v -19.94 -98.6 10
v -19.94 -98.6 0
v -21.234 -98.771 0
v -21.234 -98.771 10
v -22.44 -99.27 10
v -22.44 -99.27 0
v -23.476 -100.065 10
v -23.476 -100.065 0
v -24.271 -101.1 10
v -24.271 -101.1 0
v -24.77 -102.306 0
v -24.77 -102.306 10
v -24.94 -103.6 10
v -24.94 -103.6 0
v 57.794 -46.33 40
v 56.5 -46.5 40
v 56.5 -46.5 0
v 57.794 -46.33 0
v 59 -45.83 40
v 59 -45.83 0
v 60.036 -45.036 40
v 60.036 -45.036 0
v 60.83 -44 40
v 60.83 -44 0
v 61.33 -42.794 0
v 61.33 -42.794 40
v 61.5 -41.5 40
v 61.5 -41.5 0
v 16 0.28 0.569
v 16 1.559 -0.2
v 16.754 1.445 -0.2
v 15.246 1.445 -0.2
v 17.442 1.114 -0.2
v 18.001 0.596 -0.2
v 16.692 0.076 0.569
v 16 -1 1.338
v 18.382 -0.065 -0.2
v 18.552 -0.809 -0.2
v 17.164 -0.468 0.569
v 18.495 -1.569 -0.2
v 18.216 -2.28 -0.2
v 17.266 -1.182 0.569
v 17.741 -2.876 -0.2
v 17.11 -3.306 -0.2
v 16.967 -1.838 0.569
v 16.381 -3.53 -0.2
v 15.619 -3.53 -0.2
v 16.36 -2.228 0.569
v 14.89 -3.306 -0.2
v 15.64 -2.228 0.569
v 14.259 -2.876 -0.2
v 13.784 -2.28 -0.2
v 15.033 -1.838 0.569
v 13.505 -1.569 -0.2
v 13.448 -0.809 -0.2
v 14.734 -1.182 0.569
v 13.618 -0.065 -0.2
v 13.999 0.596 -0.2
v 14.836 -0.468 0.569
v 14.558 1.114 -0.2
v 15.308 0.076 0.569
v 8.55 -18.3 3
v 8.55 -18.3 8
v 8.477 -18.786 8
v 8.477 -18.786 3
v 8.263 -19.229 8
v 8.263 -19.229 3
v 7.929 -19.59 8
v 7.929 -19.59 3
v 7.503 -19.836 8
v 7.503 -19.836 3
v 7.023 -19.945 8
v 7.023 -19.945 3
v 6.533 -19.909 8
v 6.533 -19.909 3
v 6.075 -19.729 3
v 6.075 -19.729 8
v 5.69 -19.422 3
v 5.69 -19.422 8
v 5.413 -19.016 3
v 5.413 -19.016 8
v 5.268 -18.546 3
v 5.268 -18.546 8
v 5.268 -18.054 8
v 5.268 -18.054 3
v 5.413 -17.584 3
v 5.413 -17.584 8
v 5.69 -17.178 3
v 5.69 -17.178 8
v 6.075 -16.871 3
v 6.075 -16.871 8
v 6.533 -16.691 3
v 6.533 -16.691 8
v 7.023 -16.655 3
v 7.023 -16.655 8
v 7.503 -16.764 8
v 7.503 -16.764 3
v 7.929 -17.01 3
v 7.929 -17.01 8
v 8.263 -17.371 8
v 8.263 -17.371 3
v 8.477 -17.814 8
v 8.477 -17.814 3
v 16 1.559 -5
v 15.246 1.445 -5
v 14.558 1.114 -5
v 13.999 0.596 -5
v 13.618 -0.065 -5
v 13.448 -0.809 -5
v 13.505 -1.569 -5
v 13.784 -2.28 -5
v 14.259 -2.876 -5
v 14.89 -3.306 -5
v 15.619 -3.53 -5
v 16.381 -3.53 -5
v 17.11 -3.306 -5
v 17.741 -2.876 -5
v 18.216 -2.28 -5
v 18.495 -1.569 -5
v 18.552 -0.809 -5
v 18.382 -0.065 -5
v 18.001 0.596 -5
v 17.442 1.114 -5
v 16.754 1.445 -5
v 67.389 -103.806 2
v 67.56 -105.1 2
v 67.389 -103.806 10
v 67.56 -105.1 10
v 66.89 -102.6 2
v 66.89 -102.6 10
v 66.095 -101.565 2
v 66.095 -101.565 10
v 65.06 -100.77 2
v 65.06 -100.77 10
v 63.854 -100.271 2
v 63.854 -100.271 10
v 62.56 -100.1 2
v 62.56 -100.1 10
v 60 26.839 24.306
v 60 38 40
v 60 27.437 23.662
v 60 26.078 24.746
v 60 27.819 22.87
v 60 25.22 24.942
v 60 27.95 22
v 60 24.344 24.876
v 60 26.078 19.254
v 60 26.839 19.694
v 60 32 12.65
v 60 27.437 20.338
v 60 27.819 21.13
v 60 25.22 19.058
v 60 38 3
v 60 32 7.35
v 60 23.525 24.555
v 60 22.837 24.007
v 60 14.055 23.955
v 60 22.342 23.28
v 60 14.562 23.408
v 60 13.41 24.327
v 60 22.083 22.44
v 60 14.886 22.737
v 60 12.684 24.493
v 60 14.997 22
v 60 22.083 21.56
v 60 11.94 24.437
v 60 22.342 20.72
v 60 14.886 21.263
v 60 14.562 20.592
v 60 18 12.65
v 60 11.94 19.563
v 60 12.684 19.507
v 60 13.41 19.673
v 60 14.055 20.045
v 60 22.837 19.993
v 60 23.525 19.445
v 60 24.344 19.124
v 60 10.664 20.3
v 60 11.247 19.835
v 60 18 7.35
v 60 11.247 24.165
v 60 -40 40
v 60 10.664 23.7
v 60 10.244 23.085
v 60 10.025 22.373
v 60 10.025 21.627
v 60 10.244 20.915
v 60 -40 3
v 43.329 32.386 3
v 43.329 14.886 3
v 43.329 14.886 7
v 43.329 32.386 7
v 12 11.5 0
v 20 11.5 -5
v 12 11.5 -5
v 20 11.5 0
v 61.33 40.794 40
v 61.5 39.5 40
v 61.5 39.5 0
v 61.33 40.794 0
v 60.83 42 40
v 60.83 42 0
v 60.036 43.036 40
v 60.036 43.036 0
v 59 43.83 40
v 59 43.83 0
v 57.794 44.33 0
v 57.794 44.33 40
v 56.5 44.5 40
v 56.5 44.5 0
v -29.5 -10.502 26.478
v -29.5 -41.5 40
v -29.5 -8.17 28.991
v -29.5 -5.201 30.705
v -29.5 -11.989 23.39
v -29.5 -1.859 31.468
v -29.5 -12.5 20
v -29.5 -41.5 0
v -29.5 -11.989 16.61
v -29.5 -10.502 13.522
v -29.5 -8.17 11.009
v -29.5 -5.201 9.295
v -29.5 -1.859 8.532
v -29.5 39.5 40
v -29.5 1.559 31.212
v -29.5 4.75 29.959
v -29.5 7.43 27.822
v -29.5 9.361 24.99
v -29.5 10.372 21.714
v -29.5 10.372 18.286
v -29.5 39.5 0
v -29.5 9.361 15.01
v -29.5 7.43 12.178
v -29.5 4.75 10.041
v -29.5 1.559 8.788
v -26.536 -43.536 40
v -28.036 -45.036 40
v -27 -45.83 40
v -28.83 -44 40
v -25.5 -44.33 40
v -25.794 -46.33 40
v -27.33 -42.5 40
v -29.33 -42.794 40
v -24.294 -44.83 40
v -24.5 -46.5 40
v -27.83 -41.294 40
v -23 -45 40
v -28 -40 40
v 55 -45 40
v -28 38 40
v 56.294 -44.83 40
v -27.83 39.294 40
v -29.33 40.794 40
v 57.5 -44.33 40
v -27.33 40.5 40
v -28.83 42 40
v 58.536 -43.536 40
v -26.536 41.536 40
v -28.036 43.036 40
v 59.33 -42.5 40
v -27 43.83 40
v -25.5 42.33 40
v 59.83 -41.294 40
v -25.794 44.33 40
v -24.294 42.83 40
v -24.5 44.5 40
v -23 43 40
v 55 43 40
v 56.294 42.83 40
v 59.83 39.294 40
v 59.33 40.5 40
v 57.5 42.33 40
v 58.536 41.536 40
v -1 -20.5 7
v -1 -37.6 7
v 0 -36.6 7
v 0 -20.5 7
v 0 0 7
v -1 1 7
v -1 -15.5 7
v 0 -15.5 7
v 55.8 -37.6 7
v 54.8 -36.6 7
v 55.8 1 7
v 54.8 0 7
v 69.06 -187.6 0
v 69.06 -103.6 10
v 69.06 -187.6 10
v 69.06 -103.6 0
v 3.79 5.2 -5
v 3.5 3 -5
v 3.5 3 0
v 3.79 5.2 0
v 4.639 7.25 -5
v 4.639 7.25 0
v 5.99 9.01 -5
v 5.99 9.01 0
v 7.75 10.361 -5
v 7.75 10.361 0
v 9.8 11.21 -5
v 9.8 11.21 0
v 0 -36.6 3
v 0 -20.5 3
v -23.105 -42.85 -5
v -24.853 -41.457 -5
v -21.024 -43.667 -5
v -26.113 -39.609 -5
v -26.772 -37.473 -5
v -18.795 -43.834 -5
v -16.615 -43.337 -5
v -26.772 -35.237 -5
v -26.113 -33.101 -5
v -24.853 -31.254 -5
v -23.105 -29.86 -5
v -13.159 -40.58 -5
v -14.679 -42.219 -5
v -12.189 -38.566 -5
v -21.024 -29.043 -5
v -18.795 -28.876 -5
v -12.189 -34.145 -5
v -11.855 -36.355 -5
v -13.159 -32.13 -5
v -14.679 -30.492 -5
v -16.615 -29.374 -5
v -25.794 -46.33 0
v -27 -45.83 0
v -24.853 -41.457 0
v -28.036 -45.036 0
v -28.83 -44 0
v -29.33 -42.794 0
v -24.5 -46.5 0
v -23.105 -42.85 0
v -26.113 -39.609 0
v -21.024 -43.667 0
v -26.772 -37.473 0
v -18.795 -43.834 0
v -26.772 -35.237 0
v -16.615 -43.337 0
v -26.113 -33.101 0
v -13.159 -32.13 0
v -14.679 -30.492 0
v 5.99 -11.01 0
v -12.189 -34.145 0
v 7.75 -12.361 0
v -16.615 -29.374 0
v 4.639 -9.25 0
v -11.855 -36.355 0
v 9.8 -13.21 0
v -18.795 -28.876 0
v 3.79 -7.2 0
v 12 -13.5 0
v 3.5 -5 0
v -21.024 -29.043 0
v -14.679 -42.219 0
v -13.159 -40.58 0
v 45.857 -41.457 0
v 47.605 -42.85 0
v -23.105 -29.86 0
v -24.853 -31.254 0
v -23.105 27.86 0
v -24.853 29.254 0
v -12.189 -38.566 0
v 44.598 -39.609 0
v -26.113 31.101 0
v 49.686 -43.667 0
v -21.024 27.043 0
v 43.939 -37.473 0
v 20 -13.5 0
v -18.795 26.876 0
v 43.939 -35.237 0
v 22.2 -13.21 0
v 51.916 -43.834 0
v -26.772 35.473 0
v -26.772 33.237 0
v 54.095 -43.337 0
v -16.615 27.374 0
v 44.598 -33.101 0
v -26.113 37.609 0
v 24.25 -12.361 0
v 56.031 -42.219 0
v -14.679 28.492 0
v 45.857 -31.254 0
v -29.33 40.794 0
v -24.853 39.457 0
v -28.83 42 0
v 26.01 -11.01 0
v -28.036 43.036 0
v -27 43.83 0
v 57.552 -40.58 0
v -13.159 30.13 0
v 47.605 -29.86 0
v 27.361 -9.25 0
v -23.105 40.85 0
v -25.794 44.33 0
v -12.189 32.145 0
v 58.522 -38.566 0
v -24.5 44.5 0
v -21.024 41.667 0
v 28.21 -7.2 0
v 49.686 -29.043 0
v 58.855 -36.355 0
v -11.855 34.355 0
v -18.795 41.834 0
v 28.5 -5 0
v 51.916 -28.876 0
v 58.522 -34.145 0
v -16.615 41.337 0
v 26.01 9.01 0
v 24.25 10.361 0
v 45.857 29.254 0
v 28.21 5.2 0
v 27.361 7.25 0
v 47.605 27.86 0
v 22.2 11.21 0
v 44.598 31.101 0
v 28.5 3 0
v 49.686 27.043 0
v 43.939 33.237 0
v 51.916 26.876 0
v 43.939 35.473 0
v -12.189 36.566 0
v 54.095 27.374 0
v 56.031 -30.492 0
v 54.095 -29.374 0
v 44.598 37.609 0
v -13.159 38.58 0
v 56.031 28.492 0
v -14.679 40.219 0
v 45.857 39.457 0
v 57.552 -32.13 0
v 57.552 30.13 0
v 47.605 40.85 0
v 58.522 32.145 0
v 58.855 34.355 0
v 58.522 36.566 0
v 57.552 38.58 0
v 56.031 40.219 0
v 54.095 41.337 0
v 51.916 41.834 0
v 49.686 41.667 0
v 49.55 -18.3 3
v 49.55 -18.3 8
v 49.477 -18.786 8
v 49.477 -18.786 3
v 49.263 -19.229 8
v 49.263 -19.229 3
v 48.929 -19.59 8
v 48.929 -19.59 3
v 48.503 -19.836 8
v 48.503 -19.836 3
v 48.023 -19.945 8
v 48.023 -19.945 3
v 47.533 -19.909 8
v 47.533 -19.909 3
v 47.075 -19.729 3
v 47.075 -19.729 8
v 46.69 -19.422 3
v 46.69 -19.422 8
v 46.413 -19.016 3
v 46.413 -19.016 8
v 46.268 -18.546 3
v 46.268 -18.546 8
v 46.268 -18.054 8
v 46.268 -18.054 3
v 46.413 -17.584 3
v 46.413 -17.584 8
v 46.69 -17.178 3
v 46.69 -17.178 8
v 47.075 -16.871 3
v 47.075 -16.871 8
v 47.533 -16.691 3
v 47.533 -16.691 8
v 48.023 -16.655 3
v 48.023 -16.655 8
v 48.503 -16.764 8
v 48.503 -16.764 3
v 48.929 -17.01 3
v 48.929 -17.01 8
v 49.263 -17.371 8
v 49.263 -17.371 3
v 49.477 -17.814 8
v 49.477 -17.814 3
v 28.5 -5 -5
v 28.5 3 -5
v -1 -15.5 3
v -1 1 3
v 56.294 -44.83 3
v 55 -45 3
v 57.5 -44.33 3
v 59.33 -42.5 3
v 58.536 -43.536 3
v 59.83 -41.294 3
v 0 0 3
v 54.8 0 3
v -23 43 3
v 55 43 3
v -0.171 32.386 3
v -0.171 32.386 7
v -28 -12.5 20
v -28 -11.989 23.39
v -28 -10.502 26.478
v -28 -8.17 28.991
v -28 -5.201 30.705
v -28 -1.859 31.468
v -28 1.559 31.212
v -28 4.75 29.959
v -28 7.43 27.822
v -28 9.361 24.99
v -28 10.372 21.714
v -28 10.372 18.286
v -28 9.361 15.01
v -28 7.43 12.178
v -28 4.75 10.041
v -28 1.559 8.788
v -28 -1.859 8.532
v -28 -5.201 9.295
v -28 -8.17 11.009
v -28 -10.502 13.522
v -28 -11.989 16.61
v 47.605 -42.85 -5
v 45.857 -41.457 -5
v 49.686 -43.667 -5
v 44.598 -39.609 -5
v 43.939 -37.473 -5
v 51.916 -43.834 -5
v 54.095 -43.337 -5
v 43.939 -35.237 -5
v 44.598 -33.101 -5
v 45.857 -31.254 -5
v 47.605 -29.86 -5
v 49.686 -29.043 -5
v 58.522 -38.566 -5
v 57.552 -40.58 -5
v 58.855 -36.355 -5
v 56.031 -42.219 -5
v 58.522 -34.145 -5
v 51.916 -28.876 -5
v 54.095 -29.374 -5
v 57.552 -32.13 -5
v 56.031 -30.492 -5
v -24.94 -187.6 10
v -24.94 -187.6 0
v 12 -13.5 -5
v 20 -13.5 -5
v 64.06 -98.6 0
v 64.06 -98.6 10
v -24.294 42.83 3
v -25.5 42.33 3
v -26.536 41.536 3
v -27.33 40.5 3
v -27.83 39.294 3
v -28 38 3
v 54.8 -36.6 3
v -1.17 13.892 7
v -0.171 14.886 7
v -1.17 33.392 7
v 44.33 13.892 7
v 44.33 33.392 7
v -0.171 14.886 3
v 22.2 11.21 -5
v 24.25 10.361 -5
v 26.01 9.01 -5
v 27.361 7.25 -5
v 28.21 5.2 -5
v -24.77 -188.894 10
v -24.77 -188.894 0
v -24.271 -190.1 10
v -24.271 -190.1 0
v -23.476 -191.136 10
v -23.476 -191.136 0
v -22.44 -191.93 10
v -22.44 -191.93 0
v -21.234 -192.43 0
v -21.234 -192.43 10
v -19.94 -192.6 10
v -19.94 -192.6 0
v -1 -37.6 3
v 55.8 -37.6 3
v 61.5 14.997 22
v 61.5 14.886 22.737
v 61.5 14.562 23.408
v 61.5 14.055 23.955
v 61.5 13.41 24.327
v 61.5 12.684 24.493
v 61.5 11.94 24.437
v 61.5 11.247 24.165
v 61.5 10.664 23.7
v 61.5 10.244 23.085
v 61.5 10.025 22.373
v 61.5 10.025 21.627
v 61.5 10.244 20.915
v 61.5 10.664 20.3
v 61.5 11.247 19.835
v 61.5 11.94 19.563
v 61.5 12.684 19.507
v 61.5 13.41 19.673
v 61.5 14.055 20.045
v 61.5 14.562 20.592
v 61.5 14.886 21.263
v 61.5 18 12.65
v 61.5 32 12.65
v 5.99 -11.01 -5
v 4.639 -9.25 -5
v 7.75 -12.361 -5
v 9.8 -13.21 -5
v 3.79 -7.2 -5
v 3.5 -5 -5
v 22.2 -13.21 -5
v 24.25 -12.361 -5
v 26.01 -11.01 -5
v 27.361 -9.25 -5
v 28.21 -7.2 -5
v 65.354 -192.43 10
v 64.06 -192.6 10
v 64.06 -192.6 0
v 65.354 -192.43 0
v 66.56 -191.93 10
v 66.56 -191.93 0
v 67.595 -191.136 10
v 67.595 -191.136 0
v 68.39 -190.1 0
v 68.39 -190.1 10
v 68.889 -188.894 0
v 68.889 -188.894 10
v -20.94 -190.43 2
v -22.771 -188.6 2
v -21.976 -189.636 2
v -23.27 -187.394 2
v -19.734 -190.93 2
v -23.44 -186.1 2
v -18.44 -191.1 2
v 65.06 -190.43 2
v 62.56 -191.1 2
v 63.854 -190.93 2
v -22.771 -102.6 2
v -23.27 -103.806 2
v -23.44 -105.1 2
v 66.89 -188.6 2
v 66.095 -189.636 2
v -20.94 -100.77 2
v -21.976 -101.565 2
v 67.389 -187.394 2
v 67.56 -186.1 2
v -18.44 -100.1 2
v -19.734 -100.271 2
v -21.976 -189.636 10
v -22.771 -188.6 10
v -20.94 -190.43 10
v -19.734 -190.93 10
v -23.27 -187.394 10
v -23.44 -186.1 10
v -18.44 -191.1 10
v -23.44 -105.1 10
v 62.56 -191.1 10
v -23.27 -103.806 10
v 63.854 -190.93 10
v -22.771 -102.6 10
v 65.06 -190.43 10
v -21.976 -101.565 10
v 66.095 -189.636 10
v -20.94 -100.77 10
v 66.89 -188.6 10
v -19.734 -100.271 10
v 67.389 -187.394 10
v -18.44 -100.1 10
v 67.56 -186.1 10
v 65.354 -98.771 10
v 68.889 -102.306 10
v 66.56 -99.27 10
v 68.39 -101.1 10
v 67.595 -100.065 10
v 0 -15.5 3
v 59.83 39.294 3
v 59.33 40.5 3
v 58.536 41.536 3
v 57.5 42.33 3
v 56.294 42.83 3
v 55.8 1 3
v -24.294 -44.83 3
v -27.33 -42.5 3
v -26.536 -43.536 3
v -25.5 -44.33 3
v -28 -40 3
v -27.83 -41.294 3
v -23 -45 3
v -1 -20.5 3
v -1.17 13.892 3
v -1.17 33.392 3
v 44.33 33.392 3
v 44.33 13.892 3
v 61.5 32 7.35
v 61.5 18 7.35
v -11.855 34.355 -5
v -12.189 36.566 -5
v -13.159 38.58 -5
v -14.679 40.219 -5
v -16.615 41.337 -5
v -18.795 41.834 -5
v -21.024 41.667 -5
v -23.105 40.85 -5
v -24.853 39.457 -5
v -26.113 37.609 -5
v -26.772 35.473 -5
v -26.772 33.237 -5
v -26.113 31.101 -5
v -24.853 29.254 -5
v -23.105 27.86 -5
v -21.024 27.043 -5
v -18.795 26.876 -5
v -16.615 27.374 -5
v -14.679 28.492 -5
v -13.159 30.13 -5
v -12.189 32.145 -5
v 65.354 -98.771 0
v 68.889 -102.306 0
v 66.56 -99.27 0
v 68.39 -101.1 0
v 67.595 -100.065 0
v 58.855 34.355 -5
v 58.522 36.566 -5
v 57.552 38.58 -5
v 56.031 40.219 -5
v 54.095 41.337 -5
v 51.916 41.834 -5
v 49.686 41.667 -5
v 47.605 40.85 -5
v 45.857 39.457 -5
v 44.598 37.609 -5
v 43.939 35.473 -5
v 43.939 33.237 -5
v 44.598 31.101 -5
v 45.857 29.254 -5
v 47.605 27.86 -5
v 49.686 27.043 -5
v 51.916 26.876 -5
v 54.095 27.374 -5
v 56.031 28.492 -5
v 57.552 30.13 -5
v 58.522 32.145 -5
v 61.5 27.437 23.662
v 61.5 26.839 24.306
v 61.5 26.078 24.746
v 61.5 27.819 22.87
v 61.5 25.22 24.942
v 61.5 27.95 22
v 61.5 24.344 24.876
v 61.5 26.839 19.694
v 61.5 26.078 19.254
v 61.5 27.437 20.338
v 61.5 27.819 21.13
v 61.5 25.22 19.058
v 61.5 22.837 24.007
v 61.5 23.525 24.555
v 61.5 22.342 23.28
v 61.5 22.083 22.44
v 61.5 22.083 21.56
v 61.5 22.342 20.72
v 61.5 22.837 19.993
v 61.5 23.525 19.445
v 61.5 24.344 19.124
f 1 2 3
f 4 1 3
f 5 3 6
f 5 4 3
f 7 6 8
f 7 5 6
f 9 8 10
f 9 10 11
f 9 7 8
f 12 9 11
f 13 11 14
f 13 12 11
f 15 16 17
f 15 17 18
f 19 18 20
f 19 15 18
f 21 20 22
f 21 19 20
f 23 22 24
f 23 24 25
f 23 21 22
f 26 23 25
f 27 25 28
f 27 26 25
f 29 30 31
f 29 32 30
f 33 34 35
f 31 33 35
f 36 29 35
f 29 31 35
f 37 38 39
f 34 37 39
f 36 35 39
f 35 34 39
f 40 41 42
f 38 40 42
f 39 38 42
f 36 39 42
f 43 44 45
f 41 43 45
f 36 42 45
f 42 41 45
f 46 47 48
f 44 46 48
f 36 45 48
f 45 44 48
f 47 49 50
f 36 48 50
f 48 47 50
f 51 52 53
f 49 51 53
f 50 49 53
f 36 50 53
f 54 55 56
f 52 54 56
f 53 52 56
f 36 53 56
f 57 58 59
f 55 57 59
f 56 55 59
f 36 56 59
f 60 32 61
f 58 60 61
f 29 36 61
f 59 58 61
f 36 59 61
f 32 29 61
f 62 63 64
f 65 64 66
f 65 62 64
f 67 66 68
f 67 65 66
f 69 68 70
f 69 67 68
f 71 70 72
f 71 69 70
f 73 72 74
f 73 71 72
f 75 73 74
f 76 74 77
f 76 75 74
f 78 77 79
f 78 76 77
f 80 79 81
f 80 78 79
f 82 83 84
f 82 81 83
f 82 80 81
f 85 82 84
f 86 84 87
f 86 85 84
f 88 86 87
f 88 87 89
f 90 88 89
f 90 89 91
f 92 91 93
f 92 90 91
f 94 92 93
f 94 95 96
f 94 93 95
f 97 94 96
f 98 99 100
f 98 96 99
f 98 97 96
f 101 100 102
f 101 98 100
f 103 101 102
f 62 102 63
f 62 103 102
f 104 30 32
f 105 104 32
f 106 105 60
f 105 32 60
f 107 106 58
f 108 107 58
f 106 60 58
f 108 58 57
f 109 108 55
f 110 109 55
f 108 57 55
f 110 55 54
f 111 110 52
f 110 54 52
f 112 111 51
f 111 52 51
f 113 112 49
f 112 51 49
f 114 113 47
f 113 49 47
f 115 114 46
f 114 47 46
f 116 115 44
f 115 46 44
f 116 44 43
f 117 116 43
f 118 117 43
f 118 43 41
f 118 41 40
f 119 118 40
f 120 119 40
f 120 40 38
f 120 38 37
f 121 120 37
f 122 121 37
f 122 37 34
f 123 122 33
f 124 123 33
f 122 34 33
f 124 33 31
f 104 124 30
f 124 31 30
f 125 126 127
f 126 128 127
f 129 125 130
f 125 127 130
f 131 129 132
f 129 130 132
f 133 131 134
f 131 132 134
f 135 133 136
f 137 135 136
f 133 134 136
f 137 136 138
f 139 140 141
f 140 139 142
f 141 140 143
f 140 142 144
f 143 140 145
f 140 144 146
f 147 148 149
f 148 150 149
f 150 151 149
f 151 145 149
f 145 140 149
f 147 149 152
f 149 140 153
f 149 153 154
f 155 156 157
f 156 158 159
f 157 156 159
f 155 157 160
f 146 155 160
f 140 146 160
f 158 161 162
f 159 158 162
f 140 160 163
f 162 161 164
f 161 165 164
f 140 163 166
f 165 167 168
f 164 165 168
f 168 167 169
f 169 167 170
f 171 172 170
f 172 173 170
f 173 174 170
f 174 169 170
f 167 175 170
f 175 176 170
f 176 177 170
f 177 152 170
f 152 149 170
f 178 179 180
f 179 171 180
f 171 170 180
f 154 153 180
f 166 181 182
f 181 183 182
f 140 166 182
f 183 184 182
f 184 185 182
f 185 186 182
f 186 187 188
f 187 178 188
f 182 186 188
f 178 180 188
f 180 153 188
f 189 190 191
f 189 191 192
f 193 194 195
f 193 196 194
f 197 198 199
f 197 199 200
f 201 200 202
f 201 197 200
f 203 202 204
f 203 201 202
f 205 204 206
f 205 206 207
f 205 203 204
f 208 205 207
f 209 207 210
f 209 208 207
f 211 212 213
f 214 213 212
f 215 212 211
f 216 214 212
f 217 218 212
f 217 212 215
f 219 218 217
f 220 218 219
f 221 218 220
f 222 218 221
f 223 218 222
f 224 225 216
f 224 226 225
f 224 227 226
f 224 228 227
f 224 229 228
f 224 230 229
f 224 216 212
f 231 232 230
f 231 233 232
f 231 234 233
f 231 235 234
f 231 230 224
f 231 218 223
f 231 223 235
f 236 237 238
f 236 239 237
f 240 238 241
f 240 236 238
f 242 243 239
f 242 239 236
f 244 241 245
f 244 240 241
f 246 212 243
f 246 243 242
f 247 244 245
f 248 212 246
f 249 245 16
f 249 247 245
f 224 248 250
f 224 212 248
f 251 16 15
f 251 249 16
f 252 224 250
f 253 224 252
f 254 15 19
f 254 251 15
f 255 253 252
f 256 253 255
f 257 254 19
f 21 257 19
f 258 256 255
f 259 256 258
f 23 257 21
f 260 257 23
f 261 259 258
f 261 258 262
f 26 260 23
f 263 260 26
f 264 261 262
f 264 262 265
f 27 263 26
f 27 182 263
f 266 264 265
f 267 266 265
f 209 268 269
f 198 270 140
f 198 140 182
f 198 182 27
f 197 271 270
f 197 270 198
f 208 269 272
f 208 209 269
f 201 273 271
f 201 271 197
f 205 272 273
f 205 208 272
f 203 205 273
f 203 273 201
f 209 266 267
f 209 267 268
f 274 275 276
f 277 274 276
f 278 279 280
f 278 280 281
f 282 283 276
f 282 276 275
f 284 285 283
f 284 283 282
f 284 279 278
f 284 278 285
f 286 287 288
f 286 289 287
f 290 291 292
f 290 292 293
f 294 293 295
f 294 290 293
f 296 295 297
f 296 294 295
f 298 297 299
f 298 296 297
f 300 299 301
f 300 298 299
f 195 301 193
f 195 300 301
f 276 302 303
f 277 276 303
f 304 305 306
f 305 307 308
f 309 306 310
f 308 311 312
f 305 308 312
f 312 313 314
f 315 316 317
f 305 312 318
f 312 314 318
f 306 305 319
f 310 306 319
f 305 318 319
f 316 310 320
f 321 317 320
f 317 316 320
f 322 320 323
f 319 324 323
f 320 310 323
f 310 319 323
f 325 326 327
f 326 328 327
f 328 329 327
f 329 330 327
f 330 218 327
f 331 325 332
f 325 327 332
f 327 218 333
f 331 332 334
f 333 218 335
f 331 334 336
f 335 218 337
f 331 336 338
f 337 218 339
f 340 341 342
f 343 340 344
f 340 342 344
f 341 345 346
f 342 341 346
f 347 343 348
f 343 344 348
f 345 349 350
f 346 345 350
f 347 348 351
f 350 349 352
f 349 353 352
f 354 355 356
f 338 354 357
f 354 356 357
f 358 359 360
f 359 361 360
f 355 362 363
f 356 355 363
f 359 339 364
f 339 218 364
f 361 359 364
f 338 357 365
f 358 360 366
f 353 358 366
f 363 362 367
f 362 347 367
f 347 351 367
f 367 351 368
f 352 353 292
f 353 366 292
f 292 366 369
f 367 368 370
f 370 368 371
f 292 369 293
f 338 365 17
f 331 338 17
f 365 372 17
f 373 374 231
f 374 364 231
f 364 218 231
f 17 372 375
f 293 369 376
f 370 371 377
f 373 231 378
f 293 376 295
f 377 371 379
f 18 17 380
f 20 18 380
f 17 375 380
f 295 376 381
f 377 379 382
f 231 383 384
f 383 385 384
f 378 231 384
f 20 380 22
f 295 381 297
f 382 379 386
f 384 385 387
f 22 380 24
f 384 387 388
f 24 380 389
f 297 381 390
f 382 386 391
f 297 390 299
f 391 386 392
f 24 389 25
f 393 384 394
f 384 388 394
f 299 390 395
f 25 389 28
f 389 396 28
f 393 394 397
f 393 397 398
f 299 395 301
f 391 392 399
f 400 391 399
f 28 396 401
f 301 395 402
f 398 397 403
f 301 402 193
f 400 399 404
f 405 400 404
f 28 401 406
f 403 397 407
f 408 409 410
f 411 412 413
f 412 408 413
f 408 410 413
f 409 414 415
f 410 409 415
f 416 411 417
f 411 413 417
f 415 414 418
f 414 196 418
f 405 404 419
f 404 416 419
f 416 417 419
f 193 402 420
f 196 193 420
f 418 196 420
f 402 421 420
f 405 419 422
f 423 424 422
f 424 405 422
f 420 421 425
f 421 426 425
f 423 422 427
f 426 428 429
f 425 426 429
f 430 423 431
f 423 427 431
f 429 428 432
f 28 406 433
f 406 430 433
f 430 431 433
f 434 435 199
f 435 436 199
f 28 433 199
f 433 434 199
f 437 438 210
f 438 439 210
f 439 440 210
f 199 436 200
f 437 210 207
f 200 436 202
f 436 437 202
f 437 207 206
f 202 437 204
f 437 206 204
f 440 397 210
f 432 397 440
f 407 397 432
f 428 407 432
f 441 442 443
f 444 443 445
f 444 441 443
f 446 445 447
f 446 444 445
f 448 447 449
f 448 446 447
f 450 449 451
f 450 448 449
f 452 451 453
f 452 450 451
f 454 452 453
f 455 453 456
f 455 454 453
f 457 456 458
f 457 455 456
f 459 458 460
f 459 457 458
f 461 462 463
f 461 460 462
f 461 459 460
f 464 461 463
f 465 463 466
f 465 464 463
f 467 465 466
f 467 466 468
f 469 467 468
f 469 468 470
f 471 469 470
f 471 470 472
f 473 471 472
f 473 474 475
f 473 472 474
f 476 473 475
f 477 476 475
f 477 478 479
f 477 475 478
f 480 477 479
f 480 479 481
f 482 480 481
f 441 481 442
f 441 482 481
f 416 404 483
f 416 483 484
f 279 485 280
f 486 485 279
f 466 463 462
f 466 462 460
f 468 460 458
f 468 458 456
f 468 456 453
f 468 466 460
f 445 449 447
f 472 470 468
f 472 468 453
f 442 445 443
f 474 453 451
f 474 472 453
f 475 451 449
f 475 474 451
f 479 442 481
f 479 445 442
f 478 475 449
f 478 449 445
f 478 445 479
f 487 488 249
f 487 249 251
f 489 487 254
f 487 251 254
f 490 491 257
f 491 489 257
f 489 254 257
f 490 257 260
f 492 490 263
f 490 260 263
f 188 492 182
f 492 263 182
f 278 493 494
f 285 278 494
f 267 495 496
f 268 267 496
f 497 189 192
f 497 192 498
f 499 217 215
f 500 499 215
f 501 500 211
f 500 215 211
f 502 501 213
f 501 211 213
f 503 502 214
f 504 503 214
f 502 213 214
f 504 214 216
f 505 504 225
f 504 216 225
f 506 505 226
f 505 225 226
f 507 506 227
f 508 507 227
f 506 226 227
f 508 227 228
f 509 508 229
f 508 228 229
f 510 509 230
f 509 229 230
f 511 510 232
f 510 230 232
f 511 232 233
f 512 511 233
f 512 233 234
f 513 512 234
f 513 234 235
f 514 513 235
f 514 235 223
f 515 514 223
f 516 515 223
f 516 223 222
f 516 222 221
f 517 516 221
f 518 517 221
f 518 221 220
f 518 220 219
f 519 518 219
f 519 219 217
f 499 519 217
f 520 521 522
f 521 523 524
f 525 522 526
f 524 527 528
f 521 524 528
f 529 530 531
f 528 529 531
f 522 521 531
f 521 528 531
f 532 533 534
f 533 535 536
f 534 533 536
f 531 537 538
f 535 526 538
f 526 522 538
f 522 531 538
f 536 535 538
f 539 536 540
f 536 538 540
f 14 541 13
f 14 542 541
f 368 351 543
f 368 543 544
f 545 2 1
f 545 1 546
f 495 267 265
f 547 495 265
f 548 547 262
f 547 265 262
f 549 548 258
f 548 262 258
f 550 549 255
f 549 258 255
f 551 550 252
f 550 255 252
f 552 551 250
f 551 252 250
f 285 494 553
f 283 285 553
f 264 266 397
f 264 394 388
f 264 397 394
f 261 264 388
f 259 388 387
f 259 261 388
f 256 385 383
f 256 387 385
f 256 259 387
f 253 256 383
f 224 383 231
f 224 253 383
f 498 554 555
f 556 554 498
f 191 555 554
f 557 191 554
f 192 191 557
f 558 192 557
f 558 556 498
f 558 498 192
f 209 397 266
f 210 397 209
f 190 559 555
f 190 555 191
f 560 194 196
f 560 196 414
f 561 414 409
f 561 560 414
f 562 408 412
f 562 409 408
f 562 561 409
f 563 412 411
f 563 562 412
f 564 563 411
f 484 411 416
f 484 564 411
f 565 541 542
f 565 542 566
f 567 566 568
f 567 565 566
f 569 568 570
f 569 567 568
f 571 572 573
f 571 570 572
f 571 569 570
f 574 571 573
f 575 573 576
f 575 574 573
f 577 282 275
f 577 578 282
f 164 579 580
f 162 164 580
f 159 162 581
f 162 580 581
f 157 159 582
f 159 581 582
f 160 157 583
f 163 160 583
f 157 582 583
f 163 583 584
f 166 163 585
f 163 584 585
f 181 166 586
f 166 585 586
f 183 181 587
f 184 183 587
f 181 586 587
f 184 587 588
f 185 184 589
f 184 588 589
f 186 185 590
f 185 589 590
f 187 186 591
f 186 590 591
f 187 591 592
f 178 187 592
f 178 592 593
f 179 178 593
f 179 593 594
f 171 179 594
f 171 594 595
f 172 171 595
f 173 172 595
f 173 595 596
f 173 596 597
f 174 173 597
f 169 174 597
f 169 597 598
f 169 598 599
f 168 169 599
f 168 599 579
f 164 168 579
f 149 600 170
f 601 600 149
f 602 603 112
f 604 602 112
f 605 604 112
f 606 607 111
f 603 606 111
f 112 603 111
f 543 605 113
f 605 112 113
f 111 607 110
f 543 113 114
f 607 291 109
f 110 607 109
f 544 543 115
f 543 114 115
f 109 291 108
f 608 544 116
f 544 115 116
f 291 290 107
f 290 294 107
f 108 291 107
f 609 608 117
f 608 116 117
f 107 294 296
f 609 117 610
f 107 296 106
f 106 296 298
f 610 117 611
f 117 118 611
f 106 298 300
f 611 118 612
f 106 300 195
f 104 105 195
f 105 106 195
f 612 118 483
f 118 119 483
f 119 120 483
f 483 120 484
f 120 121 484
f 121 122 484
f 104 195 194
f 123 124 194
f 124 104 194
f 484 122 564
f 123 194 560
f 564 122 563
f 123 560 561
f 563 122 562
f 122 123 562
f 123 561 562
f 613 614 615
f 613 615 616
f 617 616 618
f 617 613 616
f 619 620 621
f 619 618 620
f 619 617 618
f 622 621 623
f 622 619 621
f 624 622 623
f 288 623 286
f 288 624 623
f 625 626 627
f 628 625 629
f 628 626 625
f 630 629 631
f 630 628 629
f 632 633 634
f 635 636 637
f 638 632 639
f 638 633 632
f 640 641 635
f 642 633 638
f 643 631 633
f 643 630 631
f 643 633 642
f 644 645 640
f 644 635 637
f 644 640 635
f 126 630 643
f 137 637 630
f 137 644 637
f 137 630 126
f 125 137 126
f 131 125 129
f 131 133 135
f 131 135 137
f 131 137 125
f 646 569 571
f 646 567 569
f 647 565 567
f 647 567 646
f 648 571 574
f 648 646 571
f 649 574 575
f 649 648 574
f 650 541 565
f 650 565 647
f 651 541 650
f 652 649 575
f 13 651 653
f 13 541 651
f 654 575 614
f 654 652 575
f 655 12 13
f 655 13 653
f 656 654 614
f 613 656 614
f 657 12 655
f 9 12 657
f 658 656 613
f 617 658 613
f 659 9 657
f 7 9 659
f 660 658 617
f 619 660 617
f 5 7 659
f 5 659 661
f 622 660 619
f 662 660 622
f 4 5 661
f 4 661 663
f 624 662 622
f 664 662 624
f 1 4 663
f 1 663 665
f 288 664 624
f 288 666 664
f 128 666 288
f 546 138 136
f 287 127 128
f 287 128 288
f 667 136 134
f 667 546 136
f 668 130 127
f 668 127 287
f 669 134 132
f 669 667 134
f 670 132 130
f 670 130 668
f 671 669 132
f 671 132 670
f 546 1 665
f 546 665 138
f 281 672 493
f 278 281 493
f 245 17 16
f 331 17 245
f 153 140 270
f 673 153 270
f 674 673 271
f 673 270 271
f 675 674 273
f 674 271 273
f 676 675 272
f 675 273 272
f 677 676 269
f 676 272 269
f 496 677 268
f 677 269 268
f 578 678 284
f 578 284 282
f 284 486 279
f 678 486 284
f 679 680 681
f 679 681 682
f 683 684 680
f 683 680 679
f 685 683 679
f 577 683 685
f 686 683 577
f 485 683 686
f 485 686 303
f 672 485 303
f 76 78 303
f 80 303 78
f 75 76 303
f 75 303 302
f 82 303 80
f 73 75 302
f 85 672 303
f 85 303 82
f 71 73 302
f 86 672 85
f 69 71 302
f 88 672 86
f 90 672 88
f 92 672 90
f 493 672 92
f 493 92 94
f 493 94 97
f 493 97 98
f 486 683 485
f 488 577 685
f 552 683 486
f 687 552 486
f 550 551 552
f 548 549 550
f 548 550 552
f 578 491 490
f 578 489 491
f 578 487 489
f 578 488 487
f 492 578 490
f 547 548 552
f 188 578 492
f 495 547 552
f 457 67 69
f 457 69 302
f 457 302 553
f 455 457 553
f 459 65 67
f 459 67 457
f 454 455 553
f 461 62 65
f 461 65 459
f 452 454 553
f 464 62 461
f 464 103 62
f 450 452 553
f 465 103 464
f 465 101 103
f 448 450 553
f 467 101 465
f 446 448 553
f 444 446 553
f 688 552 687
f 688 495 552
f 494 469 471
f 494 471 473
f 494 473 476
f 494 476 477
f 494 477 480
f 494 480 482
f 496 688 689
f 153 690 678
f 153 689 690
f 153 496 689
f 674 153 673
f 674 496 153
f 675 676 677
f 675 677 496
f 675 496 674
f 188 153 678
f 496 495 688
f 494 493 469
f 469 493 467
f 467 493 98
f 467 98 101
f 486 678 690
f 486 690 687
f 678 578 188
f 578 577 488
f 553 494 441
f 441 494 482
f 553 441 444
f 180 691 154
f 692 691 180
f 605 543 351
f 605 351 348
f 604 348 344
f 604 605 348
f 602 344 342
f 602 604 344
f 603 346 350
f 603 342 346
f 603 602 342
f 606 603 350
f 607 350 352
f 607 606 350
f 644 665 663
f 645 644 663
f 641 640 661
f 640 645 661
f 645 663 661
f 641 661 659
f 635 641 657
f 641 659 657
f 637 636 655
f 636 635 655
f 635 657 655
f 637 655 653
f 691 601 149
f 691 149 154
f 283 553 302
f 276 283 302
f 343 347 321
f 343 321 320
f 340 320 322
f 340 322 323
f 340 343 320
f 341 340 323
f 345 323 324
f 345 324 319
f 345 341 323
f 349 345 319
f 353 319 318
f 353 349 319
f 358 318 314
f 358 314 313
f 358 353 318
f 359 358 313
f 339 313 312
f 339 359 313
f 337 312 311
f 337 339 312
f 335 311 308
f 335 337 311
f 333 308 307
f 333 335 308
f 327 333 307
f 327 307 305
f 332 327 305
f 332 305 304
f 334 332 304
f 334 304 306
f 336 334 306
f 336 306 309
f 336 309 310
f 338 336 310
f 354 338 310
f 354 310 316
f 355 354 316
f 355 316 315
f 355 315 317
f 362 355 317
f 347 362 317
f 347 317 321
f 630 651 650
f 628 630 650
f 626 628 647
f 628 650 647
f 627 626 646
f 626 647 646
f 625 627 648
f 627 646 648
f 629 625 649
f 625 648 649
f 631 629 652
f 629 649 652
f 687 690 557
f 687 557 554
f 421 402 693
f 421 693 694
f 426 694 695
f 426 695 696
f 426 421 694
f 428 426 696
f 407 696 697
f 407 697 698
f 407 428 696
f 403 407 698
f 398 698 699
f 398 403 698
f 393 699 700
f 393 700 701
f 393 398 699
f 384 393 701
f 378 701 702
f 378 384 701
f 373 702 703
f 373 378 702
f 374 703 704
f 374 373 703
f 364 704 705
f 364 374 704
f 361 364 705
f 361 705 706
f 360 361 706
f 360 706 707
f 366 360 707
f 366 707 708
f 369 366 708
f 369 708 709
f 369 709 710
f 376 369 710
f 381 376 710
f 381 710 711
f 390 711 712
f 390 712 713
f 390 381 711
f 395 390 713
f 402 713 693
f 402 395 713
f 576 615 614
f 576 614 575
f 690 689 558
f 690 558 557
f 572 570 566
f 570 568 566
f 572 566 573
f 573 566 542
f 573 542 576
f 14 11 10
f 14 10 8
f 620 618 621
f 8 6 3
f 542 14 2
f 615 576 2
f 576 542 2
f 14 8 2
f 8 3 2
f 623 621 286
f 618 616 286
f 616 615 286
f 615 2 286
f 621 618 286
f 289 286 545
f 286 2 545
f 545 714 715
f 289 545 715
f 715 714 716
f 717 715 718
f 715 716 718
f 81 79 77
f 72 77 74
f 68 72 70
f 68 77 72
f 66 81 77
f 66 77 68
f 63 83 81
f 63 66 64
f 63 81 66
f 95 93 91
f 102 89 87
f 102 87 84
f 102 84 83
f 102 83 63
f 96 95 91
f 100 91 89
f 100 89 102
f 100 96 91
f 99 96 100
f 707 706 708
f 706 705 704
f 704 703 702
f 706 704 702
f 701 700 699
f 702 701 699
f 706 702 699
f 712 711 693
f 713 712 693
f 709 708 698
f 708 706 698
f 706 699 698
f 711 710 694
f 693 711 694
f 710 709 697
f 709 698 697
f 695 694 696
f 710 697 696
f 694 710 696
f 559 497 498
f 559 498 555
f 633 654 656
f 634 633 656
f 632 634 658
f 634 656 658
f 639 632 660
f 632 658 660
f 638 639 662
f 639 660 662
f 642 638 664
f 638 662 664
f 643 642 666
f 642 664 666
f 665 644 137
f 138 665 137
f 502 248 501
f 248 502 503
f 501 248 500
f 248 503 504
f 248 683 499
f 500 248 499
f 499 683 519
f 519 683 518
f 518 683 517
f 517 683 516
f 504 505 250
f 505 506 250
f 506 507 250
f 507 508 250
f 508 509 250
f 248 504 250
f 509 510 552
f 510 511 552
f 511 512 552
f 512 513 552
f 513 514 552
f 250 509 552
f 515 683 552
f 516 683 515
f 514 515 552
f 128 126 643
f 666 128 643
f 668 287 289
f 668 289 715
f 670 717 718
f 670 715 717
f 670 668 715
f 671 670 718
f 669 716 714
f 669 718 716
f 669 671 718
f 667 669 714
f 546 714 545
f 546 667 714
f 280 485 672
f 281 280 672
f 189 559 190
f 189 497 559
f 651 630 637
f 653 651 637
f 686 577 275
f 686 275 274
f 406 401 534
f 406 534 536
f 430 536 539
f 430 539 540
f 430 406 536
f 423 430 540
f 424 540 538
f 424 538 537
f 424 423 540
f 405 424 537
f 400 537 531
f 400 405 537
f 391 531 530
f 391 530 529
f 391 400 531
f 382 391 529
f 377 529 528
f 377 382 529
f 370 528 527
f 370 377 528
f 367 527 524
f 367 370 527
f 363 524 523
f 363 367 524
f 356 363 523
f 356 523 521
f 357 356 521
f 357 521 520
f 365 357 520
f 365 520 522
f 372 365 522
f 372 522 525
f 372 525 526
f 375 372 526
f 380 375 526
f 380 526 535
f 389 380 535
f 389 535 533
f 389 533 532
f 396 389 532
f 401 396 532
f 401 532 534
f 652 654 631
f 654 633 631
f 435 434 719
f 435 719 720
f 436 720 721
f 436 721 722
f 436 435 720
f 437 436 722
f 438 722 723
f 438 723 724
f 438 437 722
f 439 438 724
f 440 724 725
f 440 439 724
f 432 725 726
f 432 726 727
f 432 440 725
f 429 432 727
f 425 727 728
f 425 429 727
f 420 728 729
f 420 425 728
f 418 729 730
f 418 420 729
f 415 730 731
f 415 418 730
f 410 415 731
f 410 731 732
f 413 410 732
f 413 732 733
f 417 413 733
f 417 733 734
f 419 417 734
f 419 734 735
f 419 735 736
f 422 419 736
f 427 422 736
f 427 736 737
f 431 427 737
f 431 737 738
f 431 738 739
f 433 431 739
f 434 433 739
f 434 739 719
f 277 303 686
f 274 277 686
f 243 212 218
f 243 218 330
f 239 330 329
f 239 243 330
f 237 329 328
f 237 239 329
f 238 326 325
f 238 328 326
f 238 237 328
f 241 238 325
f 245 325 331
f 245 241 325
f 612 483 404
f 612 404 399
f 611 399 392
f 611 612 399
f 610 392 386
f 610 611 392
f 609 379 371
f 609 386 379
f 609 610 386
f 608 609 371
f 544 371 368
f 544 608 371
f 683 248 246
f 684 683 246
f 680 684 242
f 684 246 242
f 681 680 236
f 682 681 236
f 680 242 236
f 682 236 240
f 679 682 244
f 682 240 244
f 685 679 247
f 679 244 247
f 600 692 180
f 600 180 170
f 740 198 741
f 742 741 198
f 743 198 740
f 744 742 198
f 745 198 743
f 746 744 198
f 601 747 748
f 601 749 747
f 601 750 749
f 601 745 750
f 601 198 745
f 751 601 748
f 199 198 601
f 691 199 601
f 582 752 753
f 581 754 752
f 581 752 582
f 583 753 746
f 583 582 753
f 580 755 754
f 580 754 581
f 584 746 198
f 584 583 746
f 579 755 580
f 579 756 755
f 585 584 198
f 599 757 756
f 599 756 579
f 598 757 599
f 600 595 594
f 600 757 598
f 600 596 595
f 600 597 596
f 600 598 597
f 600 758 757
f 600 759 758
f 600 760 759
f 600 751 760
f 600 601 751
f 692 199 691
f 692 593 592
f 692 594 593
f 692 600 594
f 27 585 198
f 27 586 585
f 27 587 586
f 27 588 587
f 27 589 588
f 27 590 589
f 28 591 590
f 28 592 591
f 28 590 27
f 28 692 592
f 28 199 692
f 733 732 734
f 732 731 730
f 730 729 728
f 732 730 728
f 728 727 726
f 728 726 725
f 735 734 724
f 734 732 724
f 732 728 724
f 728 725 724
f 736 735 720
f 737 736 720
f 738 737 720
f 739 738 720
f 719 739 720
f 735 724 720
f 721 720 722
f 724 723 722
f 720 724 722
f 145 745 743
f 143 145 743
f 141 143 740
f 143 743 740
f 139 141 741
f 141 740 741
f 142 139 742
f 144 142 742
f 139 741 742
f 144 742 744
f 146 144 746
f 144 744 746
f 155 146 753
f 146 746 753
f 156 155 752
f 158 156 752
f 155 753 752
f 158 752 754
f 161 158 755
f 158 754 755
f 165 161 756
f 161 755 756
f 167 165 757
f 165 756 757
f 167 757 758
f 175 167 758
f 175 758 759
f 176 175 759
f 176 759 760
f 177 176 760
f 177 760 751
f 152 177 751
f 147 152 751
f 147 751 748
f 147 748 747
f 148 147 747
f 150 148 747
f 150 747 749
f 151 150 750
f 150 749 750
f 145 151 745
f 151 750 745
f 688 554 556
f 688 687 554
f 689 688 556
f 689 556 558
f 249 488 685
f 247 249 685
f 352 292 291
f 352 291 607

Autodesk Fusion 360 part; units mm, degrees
sketch "Sketch1" plane through (0, 0, 0) normal (0, 0, 1) x (1, 0, 0)
  line L0 (0, 0) -> (54.8, 0)
  line L1 (54.8, 0) -> (54.8, -36.6)
  line L2 (54.8, -36.6) -> (0, -36.6)
  line L3 (0, -36.6) -> (0, 0)
  line L4 (-0.1714, 14.8857) -> (43.3286, 14.8857)
  line L5 (43.3286, 14.8857) -> (43.3286, 32.3857)
  line L6 (43.3286, 32.3857) -> (-0.1714, 32.3857)
  line L7 (-0.1714, 32.3857) -> (-0.1714, 14.8857)
  line L8 (44.3295, 13.892) -> (-1.1705, 13.892)
  line L9 (-1.1705, 13.892) -> (-1.1705, 33.392)
  line L10 (-1.1705, 33.392) -> (44.3295, 33.392)
  line L11 (44.3295, 33.392) -> (44.3295, 13.892)
  line L12 (44.3295, 13.892) -> (-1.1705, 33.392) construction
  line L13 (-1.1705, 13.892) -> (44.3295, 33.392) construction
  line L14 (55.8, -37.6) -> (-1, -37.6)
  line L15 (-1, -37.6) -> (-1, 1)
  line L16 (-1, 1) -> (55.8, 1)
  line L17 (55.8, 1) -> (55.8, -37.6)
  line L18 (55.8, -37.6) -> (-1, 1) construction
  line L19 (-1, -37.6) -> (55.8, 1) construction
  line L20 (60, -45) -> (-28, -45)
  line L21 (-28, -45) -> (-28, 43)
  line L22 (-28, 43) -> (60, 43)
  line L23 (60, 43) -> (60, -45)
  line L24 (60, 43) -> (-28, -45) construction
  line L25 (-28, 43) -> (60, -45) construction
  line L26 (61.5, -46.5) -> (-29.5, -46.5)
  line L27 (-29.5, -46.5) -> (-29.5, 44.5)
  line L28 (-29.5, 44.5) -> (61.5, 44.5)
  line L29 (61.5, 44.5) -> (61.5, -46.5)
  line L30 (61.5, -46.5) -> (-29.5, 44.5) construction
  line L31 (-29.5, -46.5) -> (61.5, 44.5) construction
  line L32 (-23.4404, -100.1003) -> (67.5596, -100.1003)
  line L33 (67.5596, -100.1003) -> (67.5596, -191.1003)
  line L34 (67.5596, -191.1003) -> (-23.4404, -191.1003)
  line L35 (-23.4404, -191.1003) -> (-23.4404, -100.1003)
  line L36 (67.5596, -191.1003) -> (-23.4404, -100.1003) construction
  line L37 (-23.4404, -191.1003) -> (67.5596, -100.1003) construction
  line L38 (-24.9404, -98.6003) -> (69.0596, -98.6003)
  line L39 (69.0596, -98.6003) -> (69.0596, -192.6003)
  line L40 (69.0596, -192.6003) -> (-24.9404, -192.6003)
  line L41 (-24.9404, -192.6003) -> (-24.9404, -98.6003)
  line L42 (-24.9404, -98.6003) -> (69.0596, -192.6003) construction
  line L43 (69.0596, -98.6003) -> (-24.9404, -192.6003) construction
  line L44 (6.9, -18.3) -> (47.9, -18.3) construction
  circle A0 centre (47.9, -18.3) radius 1.65
  circle A1 centre (6.9, -18.3) radius 1.65
  line L45 (-1, -15.5) -> (0, -15.5)
  line L46 (0, -15.5) -> (0, -20.5)
  line L47 (0, -20.5) -> (-1, -20.5)
  line L48 (-1, -20.5) -> (-1, -15.5)
  line L49 (-1, -15.5) -> (0, -20.5) construction
  line L50 (0, -15.5) -> (-1, -20.5) construction
  point P0 (21.5795, 23.642)
  point P1 (27.4, -18.3)
  point P2 (16, -1)
  point P3 (22.0596, -145.6003)
  point P4 (22.0596, -145.6003)
  point P5 (-0.5, -18)
  dimension "d1" = 54.8
  dimension "d2" = 36.6
  dimension "d3" = 43.5
  dimension "d4" = 17.5
  dimension "d5" = 45.5
  dimension "d6" = 19.5
  dimension "d7" = 56.8
  dimension "d8" = 38.6
  dimension "d9" = 88
  dimension "d10" = 88
  dimension "d11" = 91
  dimension "d12" = 91
  dimension "d33" = 91
  dimension "d34" = 91
  dimension "d35" = 94
  dimension "d36" = 94
  dimension "d46" = 20.5
  dimension "d47" = 41
  dimension "d48" = 3.3
  dimension "d49" = 3.3
  dimension "d52" = 5
extrude "Extrude1" add sketch "Sketch1" along normal blind 40 contours L26 L27 L28 L29 makes body 1
extrude "Extrude2" add sketch "Sketch1" along normal blind 3 contours L20 L21 L22 L23 bodies 1
extrude "Extrude3" add sketch "Sketch1" along normal blind 7 contours L0 L1 L2 L3 L14 L15 L16 L17 L45 L47 | L8 L9 L10 L11 bodies 1
extrude "Extrude4" add sketch "Sketch1" along normal blind 3 contours L0 L1 L2 L3 L46 | L4 L5 L6 L7 | A0 | A1 bodies 1
sketch "Sketch2" plane through (-29.5, 0, 0) normal (-1, 0, 0) x (0, -1, 0)
  line L0 (-44.5, 0) -> (46.5, 0)
  line L1 (46.5, 0) -> (46.5, 40)
  line L2 (46.5, 40) -> (-44.5, 40)
  line L3 (-44.5, 40) -> (-44.5, 0)
  line L4 (-44.5, 40) -> (46.5, 0) construction
  line L5 (46.5, 40) -> (-44.5, 0) construction
  circle A0 centre (1, 20) radius 11.5
  dimension "d21" = 23
extrude "Extrude5" cut sketch "Sketch2" against normal up to surface (1.5 mm away) contours A0 bodies 1
sketch "Sketch3" plane through (61.5, 0, 0) normal (1, 0, 0) x (0, 1, 0)
  line L0 (-46.5, 0) -> (44.5, 0)
  line L1 (44.5, 0) -> (44.5, 40)
  line L2 (44.5, 40) -> (-46.5, 40)
  line L3 (-46.5, 40) -> (-46.5, 0)
  line L4 (32, 7.35) -> (18, 7.35)
  line L5 (18, 7.35) -> (18, 12.65)
  line L6 (18, 12.65) -> (32, 12.65)
  line L7 (32, 12.65) -> (32, 7.35)
  line L8 (32, 7.35) -> (18, 12.65) construction
  line L9 (18, 7.35) -> (32, 12.65) construction
  circle A0 centre (25, 22) radius 2.95
  circle A1 centre (12.4967, 22) radius 2.5
  point P0 (25, 10)
  dimension "d24" = 14
  dimension "d25" = 5.3
  dimension "d28" = 5.9
  dimension "d43" = 5
extrude "Extrude6" cut sketch "Sketch3" against normal up to surface (1.5 mm away) contours L4 L5 L6 L7 bodies 1
extrude "Extrude7" cut sketch "Sketch3" against normal up to surface (1.5 mm away) contours A0 bodies 1
fillet "Fillet1" radius 5 8 edges at (61.5, 44.5, 20) (60, 43, 21.5) (-28, 43, 21.5) (-29.5, 44.5, 20) (-28, -45, 21.5) (-29.5, -46.5, 20) (61.5, -46.5, 20) (60, -45, 21.5) on bodies 1
extrude "Extrude8" add sketch "Sketch1" along normal blind 2 separate body contours L32 L33 L34 L35 makes body 2
extrude "Extrude9" add sketch "Sketch1" along normal blind 10 contours L38 L39 L40 L41 bodies 2
fillet "Fillet2" radius 5 8 edges at (-23.4404, -191.1003, 6) (-24.9404, -98.6003, 5) (-23.4404, -100.1003, 6) (-24.9404, -192.6003, 5) (67.5596, -191.1003, 6) (69.0596, -192.6003, 5) (69.0596, -98.6003, 5) (67.5596, -100.1003, 6) on bodies 2
extrude "Extrude10" cut sketch "Sketch3" against normal up to surface (1.5 mm away) contours A1 bodies 1
extrude "Extrude11" add sketch "Sketch1" along normal blind 8 contours A0 | A1 bodies 1
extrude "Extrude12" add sketch "Sketch1" along normal up to surface (3 mm away) contours L3 L15 L45 L46 L47 L48 bodies 1
sketch "Sketch4" plane through (0, 0, 0) normal (0, 0, 1) x (1, 0, 0)
  line L0 (3.5, -13.5) -> (28.5, -13.5)
  line L1 (28.5, -13.5) -> (28.5, 11.5)
  line L2 (28.5, 11.5) -> (3.5, 11.5)
  line L3 (3.5, 11.5) -> (3.5, -13.5)
  line L4 (3.5, -13.5) -> (28.5, 11.5) construction
  line L5 (28.5, -13.5) -> (3.5, 11.5) construction
  line L6 (16, -1) -> (-19.3553, 34.3553) construction
  line L7 (16, -1) -> (51.3553, 34.3553) construction
  line L8 (16, -1) -> (-19.3553, -36.3553) construction
  line L9 (16, -1) -> (51.3553, -36.3553) construction
  circle A0 centre (-19.3553, 34.3553) radius 7.5
  circle A1 centre (51.3553, 34.3553) radius 7.5
  circle A2 centre (-19.3553, -36.3553) radius 7.5
  circle A3 centre (51.3553, -36.3553) radius 7.5
  point P0 (16, -1)
  dimension "d55" = 25
  dimension "d56" = 25
  dimension "d57" = 50
  dimension "d58" = 50
  dimension "d59" = 50
  dimension "d60" = 50
  dimension "d61" = 15
  dimension "d62" = 15
  dimension "d63" = 15
  dimension "d64" = 15
extrude "Extrude13" add sketch "Sketch4" against normal blind 5 bodies 1
hole "Hole1" at (16, -1, -5) direction (0, 0, 1) diameter 5.118 depth 4.8 tip angle 118 bodies 1
fillet "Fillet3" radius 8.5 4 edges at (28.5, 11.5, -2.5) (3.5, 11.5, -2.5) (3.5, -13.5, -2.5) (28.5, -13.5, -2.5) on bodies 1
equation "d5 = d3 + 2 mm"
equation "d6 = d4 + 2 mm"
equation "d7 = d1 + 2 mm"
equation "d8 = d2 + 2 mm"
equation "d11 = d10 + 3 mm"
equation "d12 = d9 + 3 mm"
equation "d33 = d12"
equation "d35 = d33 + 3 mm"
equation "d36 = d34 + 3 mm"
